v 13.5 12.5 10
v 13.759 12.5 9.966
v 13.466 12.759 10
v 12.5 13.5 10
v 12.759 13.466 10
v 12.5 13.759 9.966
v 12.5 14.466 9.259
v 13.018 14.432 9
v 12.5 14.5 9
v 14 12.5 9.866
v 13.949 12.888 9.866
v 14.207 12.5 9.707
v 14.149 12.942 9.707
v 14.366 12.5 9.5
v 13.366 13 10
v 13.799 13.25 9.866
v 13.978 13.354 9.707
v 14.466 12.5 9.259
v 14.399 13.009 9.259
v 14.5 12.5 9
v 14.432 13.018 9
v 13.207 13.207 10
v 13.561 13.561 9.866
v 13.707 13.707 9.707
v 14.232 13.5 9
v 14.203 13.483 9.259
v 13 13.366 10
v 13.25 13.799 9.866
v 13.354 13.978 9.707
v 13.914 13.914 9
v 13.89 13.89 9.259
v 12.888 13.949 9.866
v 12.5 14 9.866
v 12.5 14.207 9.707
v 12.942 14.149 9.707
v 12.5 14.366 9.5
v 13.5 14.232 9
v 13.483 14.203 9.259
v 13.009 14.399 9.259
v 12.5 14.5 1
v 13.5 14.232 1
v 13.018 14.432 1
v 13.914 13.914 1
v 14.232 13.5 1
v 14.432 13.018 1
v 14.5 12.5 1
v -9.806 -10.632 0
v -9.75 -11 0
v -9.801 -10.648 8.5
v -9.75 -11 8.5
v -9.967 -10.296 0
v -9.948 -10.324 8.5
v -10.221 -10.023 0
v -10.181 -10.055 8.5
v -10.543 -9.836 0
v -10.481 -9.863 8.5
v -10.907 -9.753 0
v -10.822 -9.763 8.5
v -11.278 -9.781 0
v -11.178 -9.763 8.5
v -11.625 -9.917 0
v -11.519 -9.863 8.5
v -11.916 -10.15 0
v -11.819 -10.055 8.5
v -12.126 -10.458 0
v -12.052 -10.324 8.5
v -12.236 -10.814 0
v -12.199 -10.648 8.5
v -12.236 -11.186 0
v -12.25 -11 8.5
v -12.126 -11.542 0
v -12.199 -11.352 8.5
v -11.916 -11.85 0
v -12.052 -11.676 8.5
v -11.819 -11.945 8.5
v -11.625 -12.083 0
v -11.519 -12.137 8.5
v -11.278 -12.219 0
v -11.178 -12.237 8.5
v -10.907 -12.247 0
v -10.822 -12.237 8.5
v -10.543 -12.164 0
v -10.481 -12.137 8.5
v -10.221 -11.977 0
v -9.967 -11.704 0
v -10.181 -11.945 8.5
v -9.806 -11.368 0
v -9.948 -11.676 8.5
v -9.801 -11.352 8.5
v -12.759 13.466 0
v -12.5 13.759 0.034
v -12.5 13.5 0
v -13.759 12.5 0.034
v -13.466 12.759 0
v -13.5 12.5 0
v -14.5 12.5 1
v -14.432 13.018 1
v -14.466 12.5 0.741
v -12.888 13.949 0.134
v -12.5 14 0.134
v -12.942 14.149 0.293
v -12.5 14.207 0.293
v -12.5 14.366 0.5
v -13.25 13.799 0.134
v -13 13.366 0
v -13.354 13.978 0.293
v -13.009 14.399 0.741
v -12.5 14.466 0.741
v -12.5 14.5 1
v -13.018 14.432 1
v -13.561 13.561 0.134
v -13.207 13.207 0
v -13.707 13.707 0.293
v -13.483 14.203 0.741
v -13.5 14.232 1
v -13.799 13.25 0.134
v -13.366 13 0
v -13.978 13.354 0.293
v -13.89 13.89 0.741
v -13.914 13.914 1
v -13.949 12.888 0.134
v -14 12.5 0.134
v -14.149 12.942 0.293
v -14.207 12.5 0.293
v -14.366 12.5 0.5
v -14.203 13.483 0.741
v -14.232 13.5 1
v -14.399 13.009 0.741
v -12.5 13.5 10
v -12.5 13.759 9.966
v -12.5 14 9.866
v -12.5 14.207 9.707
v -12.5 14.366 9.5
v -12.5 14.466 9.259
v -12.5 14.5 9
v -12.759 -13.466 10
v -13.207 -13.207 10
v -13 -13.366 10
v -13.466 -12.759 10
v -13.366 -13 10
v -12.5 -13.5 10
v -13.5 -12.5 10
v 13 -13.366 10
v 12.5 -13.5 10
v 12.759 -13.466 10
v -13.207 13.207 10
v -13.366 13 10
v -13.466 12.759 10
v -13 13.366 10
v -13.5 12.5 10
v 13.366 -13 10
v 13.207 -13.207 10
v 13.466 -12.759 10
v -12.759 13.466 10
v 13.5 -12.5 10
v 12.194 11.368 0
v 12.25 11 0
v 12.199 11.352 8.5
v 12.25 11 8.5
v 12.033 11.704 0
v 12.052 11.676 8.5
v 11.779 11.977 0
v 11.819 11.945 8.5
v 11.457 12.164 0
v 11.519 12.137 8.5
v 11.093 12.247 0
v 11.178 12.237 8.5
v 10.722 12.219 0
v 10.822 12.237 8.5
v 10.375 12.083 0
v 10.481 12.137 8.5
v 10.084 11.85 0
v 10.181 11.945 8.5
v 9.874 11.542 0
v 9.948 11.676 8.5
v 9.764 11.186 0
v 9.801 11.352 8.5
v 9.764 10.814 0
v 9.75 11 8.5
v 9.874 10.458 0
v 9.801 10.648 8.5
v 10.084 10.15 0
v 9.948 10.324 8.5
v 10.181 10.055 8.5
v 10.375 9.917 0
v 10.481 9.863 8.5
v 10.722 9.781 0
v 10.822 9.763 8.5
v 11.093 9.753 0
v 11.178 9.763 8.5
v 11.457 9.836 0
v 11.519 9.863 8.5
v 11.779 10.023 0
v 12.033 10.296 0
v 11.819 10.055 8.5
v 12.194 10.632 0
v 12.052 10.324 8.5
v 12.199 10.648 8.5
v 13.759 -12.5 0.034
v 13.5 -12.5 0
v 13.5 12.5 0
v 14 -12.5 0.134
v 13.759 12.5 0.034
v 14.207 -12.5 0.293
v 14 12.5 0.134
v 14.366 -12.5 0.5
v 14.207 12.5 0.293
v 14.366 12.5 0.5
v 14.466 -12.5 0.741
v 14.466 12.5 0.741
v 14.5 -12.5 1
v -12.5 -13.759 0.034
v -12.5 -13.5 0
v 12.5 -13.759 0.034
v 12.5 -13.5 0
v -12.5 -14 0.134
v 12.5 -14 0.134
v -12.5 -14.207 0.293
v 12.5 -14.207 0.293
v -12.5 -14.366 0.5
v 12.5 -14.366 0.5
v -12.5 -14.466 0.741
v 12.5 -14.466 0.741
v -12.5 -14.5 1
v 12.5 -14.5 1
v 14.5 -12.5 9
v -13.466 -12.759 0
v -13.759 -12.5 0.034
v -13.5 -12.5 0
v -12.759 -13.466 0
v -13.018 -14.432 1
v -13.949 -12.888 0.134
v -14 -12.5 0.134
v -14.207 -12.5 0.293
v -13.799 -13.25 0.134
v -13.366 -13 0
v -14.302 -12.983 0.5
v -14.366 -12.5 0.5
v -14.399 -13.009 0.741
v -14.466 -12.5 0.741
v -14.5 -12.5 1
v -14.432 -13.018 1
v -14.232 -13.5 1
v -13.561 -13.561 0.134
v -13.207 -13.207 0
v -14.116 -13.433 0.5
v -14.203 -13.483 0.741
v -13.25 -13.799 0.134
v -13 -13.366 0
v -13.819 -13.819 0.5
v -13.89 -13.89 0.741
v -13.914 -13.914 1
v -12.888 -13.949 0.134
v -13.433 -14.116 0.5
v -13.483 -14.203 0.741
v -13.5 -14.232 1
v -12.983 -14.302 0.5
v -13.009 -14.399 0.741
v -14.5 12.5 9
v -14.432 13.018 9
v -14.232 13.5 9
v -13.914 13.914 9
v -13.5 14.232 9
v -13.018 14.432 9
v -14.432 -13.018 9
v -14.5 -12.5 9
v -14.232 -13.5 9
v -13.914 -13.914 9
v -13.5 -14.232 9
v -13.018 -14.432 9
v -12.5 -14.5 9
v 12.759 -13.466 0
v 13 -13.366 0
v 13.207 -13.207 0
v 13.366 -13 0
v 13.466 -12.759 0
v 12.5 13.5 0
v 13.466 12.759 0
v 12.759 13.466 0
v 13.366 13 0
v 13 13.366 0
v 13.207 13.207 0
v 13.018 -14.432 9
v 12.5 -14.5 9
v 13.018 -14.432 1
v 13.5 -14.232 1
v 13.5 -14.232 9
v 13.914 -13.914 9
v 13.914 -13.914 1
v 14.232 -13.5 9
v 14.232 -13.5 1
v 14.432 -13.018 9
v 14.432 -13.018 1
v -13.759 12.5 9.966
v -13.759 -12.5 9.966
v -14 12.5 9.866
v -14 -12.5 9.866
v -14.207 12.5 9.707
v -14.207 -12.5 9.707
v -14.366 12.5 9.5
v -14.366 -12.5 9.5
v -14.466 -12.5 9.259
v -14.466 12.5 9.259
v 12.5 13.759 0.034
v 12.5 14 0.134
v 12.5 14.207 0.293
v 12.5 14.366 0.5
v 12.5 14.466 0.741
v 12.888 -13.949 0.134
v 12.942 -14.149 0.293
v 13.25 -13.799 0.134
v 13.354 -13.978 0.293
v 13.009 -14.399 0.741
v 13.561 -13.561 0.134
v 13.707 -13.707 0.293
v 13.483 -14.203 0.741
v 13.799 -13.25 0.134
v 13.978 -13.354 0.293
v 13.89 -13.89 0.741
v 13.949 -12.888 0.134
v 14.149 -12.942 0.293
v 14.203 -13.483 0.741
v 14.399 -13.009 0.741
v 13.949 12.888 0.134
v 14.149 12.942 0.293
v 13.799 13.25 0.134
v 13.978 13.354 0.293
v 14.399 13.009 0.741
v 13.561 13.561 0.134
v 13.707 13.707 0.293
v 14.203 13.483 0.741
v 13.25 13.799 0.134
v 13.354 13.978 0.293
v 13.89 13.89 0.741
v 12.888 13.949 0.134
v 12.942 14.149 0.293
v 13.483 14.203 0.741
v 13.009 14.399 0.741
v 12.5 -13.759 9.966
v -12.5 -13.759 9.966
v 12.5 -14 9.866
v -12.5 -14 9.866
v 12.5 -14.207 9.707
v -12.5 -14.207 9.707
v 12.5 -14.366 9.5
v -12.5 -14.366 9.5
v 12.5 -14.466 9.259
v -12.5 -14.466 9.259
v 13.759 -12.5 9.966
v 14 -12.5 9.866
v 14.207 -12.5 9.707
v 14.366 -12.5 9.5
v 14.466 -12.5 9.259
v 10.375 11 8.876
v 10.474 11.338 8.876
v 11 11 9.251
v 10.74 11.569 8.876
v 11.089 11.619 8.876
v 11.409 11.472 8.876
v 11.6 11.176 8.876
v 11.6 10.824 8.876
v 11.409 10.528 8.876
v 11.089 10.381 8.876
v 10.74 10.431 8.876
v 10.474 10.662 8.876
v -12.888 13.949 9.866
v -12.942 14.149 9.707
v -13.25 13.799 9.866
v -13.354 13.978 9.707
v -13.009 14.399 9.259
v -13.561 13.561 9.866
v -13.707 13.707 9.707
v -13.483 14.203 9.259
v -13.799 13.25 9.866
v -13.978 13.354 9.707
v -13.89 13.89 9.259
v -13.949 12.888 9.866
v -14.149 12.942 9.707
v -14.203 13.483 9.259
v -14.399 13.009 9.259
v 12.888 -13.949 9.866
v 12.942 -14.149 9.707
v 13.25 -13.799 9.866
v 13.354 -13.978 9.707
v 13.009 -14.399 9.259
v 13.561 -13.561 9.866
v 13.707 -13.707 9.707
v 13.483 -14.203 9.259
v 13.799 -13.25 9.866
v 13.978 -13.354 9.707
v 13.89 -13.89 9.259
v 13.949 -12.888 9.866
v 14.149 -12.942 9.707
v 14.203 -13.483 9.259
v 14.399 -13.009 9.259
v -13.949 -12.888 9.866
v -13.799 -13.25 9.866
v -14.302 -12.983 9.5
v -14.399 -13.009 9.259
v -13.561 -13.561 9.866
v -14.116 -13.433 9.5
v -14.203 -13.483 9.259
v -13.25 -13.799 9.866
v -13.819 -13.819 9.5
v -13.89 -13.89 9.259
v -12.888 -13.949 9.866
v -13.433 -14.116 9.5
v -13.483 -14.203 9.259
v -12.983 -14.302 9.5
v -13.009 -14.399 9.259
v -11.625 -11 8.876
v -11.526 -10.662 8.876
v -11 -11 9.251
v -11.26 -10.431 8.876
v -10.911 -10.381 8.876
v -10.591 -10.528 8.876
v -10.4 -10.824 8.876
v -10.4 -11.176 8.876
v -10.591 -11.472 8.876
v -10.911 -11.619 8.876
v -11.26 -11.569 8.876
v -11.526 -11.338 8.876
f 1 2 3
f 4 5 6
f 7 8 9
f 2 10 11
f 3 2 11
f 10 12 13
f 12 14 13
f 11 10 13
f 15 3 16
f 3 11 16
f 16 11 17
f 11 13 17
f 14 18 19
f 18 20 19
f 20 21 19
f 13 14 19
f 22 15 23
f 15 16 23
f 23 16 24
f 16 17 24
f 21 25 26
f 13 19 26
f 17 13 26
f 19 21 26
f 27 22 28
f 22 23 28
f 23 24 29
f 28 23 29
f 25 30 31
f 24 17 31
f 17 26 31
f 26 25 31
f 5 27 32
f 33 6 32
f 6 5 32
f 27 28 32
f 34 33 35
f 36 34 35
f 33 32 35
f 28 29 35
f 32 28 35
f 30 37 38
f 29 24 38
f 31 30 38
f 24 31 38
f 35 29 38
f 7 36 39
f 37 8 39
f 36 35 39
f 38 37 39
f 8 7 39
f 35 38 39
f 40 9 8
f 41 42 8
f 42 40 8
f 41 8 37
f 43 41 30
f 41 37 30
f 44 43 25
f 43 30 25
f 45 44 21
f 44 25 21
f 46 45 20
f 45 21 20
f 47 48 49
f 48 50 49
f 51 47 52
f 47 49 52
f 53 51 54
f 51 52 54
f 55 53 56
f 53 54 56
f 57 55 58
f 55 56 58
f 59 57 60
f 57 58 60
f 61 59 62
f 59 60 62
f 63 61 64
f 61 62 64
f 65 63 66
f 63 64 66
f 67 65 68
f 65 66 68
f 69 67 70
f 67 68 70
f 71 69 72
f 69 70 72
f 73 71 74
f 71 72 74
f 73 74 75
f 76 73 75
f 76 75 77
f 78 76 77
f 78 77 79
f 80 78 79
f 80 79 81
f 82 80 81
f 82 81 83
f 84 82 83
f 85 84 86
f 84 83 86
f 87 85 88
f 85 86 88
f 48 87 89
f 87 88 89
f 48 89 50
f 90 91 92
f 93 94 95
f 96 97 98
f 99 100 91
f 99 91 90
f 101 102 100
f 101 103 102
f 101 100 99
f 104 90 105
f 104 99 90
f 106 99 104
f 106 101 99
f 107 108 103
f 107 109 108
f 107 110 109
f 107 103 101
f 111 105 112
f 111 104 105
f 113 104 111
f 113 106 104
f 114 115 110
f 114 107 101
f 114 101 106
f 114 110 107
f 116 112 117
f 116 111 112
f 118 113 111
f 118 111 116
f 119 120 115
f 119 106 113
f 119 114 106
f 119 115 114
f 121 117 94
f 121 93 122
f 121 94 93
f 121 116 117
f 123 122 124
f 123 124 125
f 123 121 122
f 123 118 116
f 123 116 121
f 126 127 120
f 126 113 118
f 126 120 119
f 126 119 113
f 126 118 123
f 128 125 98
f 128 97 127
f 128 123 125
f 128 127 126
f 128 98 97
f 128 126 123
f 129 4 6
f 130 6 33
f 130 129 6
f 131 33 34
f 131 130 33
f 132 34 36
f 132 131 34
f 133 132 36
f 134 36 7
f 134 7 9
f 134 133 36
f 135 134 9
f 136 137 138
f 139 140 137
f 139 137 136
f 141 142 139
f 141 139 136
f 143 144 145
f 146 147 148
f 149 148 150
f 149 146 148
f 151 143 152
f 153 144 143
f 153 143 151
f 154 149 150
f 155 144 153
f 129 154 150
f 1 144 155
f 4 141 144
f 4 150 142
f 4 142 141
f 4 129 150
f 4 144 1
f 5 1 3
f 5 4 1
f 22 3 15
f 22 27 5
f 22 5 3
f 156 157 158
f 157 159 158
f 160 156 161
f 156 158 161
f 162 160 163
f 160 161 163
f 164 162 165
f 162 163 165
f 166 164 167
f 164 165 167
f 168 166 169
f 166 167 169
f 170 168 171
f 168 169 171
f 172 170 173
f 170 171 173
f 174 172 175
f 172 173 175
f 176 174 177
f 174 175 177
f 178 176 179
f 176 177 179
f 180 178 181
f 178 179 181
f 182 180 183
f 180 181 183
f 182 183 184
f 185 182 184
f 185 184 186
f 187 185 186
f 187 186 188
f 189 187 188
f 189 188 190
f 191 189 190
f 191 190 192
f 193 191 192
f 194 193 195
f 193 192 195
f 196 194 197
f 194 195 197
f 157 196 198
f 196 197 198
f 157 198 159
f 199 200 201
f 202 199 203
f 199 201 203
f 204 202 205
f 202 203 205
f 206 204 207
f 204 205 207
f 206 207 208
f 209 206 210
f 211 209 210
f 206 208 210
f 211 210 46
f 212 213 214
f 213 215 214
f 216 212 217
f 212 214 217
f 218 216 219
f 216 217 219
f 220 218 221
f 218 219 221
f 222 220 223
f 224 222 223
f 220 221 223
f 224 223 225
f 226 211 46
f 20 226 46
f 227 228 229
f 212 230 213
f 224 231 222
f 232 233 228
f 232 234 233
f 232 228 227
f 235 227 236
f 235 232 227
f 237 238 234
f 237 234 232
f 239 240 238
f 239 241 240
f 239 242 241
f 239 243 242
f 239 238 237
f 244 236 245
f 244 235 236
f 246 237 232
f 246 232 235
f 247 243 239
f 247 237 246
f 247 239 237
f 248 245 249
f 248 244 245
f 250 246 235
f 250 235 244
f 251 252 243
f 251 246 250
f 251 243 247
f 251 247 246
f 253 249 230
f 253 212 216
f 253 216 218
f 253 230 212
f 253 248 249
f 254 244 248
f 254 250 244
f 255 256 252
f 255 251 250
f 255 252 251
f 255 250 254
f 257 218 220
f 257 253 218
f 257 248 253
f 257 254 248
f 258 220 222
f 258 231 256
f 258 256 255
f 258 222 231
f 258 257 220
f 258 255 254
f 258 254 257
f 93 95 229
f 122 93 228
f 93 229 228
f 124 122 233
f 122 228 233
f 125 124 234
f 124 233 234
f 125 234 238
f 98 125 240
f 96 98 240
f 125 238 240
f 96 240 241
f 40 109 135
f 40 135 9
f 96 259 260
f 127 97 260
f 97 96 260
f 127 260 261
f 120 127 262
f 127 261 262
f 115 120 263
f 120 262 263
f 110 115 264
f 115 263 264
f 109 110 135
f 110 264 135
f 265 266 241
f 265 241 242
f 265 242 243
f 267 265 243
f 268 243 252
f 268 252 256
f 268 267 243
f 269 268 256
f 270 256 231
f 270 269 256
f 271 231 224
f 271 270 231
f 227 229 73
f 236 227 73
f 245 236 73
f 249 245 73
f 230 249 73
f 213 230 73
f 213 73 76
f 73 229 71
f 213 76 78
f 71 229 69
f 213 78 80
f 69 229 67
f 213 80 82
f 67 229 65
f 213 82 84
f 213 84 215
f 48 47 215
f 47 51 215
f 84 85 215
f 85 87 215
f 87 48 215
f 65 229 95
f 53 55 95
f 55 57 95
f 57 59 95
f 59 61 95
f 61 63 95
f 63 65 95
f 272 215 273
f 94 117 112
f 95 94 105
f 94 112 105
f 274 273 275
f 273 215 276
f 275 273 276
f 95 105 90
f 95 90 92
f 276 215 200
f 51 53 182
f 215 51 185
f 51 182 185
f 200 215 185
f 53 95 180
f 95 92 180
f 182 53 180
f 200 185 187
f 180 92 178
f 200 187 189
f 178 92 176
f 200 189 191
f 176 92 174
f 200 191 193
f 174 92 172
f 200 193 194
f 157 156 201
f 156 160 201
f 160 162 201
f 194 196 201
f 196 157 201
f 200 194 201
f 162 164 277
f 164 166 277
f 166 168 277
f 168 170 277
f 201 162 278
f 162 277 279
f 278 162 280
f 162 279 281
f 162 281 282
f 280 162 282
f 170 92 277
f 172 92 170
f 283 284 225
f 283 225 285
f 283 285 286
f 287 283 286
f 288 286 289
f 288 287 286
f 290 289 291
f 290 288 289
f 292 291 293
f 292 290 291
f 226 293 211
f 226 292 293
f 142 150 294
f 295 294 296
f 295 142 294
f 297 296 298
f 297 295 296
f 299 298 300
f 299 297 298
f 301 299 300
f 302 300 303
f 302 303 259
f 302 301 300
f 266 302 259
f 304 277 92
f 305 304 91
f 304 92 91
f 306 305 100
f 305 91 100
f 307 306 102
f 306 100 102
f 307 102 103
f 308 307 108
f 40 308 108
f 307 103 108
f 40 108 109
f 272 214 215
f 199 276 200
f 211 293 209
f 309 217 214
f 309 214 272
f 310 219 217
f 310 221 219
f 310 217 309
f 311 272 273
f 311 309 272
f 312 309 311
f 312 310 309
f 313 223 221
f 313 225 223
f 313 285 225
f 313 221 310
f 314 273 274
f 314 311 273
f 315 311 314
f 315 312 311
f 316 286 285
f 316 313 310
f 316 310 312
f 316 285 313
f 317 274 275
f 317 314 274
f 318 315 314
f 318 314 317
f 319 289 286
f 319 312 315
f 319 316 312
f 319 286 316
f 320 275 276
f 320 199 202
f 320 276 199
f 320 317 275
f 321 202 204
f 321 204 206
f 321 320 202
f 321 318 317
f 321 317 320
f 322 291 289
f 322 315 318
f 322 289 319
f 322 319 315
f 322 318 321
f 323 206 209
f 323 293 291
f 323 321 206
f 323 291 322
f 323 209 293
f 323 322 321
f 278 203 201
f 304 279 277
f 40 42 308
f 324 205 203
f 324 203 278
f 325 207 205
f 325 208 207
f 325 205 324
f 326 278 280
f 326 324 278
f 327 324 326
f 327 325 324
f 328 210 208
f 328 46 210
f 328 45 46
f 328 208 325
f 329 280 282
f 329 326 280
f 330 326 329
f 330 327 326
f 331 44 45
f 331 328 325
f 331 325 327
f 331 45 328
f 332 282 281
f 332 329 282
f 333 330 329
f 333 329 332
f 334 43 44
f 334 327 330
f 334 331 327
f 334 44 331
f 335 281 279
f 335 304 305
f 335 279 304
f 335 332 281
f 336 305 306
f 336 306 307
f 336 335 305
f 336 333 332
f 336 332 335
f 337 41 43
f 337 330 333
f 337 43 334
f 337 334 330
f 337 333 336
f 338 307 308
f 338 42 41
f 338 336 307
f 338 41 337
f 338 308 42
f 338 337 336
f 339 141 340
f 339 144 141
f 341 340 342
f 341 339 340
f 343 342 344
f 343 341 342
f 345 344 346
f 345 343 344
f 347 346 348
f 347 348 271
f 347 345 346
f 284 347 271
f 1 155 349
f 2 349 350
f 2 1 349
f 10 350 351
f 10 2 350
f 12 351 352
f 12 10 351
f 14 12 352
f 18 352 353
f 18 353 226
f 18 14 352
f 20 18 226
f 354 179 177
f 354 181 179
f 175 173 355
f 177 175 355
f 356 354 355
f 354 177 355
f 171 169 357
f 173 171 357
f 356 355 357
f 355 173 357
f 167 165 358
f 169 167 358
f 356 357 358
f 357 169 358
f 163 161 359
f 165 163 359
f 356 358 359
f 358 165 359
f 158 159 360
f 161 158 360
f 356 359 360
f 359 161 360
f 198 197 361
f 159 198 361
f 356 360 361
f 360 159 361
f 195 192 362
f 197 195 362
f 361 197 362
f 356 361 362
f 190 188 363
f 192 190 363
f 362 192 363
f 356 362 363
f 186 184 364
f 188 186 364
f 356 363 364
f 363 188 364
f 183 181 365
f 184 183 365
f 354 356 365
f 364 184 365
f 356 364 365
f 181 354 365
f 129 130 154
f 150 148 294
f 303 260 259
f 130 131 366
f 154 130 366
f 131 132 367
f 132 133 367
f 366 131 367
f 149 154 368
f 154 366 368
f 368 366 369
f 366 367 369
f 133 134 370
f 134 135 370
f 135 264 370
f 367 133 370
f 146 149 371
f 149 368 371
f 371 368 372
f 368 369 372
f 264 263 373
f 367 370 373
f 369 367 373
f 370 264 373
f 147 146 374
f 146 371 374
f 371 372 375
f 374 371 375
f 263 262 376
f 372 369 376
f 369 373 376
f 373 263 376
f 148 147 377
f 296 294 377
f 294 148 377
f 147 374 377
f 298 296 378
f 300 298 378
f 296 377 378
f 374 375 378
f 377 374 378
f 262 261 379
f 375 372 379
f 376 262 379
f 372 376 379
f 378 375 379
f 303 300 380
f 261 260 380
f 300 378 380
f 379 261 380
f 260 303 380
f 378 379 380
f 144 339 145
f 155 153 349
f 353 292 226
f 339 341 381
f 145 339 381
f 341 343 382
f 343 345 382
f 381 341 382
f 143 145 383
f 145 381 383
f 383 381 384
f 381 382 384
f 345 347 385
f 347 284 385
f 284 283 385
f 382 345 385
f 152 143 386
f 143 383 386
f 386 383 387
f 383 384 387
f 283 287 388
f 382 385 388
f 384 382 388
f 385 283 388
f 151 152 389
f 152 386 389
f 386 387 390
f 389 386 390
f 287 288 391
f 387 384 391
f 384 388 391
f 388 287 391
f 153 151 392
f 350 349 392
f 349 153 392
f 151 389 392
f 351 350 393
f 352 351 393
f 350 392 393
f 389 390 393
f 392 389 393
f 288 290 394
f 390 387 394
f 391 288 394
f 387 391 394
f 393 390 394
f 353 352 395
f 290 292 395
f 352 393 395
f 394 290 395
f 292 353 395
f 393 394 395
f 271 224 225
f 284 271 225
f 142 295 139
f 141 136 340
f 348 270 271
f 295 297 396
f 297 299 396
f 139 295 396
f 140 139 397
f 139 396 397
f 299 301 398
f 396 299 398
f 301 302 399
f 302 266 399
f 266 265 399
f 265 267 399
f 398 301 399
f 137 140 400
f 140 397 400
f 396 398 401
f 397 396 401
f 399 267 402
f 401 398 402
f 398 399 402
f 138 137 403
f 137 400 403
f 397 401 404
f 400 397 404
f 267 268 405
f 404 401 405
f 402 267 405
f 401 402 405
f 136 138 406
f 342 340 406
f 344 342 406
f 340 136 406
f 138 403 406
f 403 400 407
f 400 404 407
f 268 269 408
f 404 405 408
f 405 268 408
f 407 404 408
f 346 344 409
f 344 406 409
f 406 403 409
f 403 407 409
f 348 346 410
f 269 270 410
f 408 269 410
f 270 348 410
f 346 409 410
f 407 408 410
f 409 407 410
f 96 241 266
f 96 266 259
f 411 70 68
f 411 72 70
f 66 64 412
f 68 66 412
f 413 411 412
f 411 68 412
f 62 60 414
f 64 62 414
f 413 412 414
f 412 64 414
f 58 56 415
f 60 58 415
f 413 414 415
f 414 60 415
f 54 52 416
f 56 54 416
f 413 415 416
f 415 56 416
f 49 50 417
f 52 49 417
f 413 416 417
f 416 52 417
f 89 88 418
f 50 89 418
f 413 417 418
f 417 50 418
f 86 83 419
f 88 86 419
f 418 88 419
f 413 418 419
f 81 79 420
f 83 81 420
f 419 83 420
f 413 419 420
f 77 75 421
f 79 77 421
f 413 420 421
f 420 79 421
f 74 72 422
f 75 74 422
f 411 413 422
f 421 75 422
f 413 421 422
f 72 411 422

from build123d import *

# Parameters (mm, degrees)
ESQUISSE1_W           = 29
ESQUISSE1_H           = 29
BOSS_EXTRU_1_DEPTH    = 10
TROU_TARAUD_M32_D     = 2.5
TROU_TARAUD_M32_DEPTH = 8.5
TROU_TARAUD_M32_TIP   = 0.751075774
CONG_2_R              = 2
CONG_1_R              = 1


with BuildPart() as part:
    # Esquisse1 → Boss.-Extru.1 (new body)
    with BuildSketch(Plane.XY):
        Rectangle(ESQUISSE1_W, ESQUISSE1_H)
    extrude(amount=BOSS_EXTRU_1_DEPTH)

    # Trou taraudé M32
    with Locations(Plane(origin=(0, 0, 0), x_dir=(-1, 0, 0), z_dir=(0, 0, -1))):
        with Locations((-11, 11), (11, -11)):
            Hole(TROU_TARAUD_M32_D / 2, depth=TROU_TARAUD_M32_DEPTH)
            with Locations((0, 0, -(TROU_TARAUD_M32_DEPTH + TROU_TARAUD_M32_TIP / 2))):  # 118° drill point
                Cone(0, TROU_TARAUD_M32_D / 2, TROU_TARAUD_M32_TIP, mode=Mode.SUBTRACT)

    # Congé 2
    cong_2_edges = [part.edges().sort_by_distance(p)[0] for p in [
        (-14.5, 14.5, 5),
        (14.5, 14.5, 5),
        (14.5, -14.5, 5),
        (-14.5, -14.5, 5),
    ]]
    fillet(cong_2_edges, radius=CONG_2_R)

    # Congé1
    cong_1_edges = [part.edges().sort_by_distance(p)[0] for p in [
        (0, -14.5, 0),
        (0, -14.5, 10),
        (-14.5, 0, 0),
        (0, 14.5, 0),
        (14.5, 0, 0),
        (-13.914213562, 13.914213562, 0),
        (13.914213562, 13.914213562, 0),
        (13.914213562, -13.914213562, 0),
        (-13.914213562, -13.914213562, 0),
        (-14.5, 0, 10),
        (14.5, 0, 10),
        (0, 14.5, 10),
        (-13.914213562, 13.914213562, 10),
        (13.914213562, 13.914213562, 10),
        (13.914213562, -13.914213562, 10),
        (-13.914213562, -13.914213562, 10),
    ]]
    fillet(cong_1_edges, radius=CONG_1_R)


solid = part.part
